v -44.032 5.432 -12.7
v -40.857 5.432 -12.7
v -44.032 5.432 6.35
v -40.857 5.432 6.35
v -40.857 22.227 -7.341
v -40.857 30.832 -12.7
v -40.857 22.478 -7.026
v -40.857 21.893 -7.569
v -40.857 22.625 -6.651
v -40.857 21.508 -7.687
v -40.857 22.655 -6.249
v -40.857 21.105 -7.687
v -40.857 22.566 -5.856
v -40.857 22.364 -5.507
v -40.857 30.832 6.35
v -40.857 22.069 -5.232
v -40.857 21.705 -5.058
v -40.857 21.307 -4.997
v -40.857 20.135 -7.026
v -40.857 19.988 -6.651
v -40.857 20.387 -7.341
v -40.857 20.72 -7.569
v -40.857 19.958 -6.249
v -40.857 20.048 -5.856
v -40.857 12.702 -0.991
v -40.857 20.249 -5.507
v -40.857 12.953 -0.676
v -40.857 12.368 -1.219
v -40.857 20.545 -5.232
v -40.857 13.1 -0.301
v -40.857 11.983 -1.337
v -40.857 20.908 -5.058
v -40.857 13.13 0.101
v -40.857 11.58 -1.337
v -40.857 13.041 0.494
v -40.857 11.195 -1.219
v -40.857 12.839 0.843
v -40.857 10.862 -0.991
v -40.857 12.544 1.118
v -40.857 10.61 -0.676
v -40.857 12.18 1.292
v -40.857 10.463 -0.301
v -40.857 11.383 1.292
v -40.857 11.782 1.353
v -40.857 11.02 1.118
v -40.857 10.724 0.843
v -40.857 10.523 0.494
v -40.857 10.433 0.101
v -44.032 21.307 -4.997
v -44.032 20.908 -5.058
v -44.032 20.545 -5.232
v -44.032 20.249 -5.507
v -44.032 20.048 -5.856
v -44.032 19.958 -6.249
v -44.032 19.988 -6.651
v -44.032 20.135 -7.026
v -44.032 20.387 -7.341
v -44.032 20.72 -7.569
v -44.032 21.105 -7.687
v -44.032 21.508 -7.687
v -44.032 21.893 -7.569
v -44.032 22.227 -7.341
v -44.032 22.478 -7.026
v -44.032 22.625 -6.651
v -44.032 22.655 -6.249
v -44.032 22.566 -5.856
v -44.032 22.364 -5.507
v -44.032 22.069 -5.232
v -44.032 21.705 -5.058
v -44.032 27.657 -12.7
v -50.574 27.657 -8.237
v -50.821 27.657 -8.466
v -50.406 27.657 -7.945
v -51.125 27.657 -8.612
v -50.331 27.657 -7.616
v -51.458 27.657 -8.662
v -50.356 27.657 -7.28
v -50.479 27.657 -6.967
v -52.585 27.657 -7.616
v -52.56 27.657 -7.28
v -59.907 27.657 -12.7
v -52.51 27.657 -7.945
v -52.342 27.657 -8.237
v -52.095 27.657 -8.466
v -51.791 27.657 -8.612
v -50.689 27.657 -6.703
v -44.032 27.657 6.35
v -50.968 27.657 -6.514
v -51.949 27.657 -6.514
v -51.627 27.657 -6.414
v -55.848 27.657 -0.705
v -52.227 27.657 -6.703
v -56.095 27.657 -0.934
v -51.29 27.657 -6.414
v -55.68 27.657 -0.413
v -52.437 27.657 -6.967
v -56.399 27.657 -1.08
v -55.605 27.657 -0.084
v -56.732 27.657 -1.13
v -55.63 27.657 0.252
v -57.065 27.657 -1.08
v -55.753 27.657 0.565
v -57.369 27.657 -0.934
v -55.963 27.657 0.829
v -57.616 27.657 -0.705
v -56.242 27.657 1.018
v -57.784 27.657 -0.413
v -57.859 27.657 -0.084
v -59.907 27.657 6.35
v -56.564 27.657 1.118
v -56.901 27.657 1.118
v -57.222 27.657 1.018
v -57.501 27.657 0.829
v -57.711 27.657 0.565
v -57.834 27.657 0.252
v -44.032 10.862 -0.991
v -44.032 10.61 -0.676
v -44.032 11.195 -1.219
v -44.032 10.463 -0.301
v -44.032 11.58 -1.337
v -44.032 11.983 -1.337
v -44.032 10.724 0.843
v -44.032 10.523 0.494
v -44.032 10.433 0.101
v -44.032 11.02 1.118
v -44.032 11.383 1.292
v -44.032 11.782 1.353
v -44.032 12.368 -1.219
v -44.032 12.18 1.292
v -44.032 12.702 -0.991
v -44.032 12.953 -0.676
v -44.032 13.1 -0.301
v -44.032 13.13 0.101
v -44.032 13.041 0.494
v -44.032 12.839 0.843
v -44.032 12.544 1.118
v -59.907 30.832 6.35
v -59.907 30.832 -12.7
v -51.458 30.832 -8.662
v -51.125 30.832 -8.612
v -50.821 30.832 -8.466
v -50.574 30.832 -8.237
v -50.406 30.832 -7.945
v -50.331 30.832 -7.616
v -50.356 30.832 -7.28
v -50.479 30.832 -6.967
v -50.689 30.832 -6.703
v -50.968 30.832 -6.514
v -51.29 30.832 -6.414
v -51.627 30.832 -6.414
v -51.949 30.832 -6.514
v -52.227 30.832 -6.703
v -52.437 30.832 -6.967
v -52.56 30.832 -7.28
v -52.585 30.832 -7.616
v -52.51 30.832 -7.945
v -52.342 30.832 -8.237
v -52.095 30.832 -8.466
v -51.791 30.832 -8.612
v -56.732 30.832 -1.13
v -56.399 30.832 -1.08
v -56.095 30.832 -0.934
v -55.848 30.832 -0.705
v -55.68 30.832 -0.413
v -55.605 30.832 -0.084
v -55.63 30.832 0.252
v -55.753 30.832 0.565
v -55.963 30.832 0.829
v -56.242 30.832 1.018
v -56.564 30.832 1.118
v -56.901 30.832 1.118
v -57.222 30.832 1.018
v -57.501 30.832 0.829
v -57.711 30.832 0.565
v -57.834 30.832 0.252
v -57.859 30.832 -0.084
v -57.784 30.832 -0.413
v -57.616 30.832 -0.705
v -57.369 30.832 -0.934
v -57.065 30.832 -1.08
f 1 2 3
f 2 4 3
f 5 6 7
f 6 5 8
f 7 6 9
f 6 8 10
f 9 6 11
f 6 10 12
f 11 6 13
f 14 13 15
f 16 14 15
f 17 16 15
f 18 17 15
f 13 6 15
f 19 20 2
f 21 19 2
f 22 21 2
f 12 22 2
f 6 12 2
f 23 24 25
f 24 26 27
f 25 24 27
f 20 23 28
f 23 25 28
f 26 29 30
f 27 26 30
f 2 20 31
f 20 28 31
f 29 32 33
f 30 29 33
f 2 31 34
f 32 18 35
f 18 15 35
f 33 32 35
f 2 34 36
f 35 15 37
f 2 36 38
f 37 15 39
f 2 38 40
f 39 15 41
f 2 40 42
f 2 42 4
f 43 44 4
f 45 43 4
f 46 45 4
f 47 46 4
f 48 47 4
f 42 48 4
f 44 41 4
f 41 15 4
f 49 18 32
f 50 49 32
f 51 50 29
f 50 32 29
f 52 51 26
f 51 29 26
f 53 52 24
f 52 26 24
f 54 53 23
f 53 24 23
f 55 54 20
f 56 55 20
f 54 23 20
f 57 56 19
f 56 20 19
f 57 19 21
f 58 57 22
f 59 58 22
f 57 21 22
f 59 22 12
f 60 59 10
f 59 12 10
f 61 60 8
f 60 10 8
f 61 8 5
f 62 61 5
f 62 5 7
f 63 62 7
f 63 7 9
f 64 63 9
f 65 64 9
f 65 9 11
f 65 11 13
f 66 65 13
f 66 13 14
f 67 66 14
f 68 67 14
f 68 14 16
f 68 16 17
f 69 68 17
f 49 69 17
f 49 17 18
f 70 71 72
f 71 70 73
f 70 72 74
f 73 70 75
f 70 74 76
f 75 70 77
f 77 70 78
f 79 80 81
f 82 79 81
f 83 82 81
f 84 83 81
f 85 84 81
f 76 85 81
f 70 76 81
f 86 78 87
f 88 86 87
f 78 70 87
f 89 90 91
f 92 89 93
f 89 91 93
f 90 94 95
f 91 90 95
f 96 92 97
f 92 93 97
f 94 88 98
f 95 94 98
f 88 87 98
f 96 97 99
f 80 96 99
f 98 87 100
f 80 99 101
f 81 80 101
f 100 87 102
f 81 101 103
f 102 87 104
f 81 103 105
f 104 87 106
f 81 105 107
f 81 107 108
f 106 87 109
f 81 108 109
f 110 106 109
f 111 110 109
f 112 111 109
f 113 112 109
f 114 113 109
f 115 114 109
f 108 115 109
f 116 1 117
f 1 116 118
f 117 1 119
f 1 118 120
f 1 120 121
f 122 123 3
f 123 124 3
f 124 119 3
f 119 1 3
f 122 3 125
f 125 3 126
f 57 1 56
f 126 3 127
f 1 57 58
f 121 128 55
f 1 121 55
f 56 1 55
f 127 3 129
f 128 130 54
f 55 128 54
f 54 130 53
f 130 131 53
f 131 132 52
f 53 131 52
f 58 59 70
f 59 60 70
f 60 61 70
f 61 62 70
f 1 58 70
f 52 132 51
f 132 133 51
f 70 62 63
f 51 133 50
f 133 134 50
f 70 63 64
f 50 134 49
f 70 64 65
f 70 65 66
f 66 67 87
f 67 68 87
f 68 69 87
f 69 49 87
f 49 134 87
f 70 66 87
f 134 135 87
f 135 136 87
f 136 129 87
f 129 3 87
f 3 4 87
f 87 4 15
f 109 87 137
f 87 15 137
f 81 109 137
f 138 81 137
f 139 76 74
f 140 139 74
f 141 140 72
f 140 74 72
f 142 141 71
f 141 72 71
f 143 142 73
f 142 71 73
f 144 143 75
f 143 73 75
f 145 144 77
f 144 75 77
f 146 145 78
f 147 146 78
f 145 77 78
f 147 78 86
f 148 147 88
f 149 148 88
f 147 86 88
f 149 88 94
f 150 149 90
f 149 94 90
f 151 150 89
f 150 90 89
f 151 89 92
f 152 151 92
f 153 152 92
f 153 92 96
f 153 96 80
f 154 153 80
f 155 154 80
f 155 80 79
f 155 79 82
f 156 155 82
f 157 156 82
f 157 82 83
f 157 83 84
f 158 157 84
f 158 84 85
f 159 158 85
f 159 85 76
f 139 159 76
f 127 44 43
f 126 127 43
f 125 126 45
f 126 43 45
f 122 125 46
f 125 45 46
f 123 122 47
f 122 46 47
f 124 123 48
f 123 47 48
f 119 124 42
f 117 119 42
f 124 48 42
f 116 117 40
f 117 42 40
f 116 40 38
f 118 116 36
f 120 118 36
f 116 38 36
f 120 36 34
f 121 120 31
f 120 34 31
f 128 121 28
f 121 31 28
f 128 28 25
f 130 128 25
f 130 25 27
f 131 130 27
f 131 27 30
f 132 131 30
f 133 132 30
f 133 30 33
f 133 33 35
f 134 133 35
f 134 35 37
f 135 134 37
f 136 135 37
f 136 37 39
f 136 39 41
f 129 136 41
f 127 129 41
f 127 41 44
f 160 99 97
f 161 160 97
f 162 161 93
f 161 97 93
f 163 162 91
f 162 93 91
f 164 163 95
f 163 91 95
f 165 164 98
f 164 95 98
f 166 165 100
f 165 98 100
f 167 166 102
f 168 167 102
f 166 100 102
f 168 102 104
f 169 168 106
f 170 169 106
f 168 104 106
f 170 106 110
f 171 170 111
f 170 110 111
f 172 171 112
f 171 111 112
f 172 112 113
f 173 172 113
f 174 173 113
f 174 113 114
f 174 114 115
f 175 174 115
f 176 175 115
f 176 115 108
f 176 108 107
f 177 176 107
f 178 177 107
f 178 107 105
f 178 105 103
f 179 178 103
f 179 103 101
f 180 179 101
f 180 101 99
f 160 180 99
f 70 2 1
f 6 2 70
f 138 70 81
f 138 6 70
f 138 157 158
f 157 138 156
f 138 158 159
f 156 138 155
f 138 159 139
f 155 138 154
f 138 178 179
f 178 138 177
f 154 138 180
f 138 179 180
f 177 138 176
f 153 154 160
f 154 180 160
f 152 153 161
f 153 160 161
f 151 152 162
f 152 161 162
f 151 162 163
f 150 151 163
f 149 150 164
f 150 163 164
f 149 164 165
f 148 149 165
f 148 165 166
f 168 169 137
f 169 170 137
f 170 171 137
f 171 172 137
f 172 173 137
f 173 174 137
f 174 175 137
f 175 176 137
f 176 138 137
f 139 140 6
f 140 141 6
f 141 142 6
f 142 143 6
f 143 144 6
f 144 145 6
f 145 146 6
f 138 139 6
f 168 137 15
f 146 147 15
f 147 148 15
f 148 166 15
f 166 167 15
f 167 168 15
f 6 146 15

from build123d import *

# Parameters (mm, degrees)
BOSS_EXTRUDE1_DEPTH           = 6.35
BOSS_EXTRUDE1_DEPTH_BACK      = 12.7
TAP_DRILL_FOR_6_32_TAP1_D     = 2.7051
TAP_DRILL_FOR_4_40_TAP1_D     = 2.2606
TAP_DRILL_FOR_4_40_TAP1_DEPTH = 3.302
TAP_DRILL_FOR_4_40_TAP1_TIP   = 0.679152758


with BuildPart() as part:
    # Sketch1 → Boss-Extrude1 (new body, two sides)
    with BuildSketch(Plane.XY) as boss_extrude1_sk:
        Polygon((-59.907074584, 30.83161157), (-40.857074584, 30.83161157), (-40.857074584, 5.43161157), (-44.032074584, 5.43161157), (-44.032074584, 27.65661157), (-59.907074584, 27.65661157), align=None)
    extrude(amount=BOSS_EXTRUDE1_DEPTH)
    extrude(boss_extrude1_sk.sketch, amount=-BOSS_EXTRUDE1_DEPTH_BACK)

    # Tap Drill for #6-32 Tap1 (through all)
    with Locations(Plane(origin=(-44.032074584, 11.78161157, 0), x_dir=(0, 0, -1), z_dir=(-1, 0, 0))):
        with Locations((0, 0), (6.35, -9.525)):
            Hole(TAP_DRILL_FOR_6_32_TAP1_D / 2)

    # Tap Drill for #4-40 Tap1
    with Locations(Plane(origin=(-51.458153967, 30.83161157, -7.531939217), x_dir=(0, 0, 1), z_dir=(0, 1, 0))):
        with Locations((0, 0), (7.531939217, -5.273920617)):
            Hole(TAP_DRILL_FOR_4_40_TAP1_D / 2, depth=TAP_DRILL_FOR_4_40_TAP1_DEPTH)
            with Locations((0, 0, -(TAP_DRILL_FOR_4_40_TAP1_DEPTH + TAP_DRILL_FOR_4_40_TAP1_TIP / 2))):  # 118° drill point
                Cone(0, TAP_DRILL_FOR_4_40_TAP1_D / 2, TAP_DRILL_FOR_4_40_TAP1_TIP, mode=Mode.SUBTRACT)


solid = part.part
